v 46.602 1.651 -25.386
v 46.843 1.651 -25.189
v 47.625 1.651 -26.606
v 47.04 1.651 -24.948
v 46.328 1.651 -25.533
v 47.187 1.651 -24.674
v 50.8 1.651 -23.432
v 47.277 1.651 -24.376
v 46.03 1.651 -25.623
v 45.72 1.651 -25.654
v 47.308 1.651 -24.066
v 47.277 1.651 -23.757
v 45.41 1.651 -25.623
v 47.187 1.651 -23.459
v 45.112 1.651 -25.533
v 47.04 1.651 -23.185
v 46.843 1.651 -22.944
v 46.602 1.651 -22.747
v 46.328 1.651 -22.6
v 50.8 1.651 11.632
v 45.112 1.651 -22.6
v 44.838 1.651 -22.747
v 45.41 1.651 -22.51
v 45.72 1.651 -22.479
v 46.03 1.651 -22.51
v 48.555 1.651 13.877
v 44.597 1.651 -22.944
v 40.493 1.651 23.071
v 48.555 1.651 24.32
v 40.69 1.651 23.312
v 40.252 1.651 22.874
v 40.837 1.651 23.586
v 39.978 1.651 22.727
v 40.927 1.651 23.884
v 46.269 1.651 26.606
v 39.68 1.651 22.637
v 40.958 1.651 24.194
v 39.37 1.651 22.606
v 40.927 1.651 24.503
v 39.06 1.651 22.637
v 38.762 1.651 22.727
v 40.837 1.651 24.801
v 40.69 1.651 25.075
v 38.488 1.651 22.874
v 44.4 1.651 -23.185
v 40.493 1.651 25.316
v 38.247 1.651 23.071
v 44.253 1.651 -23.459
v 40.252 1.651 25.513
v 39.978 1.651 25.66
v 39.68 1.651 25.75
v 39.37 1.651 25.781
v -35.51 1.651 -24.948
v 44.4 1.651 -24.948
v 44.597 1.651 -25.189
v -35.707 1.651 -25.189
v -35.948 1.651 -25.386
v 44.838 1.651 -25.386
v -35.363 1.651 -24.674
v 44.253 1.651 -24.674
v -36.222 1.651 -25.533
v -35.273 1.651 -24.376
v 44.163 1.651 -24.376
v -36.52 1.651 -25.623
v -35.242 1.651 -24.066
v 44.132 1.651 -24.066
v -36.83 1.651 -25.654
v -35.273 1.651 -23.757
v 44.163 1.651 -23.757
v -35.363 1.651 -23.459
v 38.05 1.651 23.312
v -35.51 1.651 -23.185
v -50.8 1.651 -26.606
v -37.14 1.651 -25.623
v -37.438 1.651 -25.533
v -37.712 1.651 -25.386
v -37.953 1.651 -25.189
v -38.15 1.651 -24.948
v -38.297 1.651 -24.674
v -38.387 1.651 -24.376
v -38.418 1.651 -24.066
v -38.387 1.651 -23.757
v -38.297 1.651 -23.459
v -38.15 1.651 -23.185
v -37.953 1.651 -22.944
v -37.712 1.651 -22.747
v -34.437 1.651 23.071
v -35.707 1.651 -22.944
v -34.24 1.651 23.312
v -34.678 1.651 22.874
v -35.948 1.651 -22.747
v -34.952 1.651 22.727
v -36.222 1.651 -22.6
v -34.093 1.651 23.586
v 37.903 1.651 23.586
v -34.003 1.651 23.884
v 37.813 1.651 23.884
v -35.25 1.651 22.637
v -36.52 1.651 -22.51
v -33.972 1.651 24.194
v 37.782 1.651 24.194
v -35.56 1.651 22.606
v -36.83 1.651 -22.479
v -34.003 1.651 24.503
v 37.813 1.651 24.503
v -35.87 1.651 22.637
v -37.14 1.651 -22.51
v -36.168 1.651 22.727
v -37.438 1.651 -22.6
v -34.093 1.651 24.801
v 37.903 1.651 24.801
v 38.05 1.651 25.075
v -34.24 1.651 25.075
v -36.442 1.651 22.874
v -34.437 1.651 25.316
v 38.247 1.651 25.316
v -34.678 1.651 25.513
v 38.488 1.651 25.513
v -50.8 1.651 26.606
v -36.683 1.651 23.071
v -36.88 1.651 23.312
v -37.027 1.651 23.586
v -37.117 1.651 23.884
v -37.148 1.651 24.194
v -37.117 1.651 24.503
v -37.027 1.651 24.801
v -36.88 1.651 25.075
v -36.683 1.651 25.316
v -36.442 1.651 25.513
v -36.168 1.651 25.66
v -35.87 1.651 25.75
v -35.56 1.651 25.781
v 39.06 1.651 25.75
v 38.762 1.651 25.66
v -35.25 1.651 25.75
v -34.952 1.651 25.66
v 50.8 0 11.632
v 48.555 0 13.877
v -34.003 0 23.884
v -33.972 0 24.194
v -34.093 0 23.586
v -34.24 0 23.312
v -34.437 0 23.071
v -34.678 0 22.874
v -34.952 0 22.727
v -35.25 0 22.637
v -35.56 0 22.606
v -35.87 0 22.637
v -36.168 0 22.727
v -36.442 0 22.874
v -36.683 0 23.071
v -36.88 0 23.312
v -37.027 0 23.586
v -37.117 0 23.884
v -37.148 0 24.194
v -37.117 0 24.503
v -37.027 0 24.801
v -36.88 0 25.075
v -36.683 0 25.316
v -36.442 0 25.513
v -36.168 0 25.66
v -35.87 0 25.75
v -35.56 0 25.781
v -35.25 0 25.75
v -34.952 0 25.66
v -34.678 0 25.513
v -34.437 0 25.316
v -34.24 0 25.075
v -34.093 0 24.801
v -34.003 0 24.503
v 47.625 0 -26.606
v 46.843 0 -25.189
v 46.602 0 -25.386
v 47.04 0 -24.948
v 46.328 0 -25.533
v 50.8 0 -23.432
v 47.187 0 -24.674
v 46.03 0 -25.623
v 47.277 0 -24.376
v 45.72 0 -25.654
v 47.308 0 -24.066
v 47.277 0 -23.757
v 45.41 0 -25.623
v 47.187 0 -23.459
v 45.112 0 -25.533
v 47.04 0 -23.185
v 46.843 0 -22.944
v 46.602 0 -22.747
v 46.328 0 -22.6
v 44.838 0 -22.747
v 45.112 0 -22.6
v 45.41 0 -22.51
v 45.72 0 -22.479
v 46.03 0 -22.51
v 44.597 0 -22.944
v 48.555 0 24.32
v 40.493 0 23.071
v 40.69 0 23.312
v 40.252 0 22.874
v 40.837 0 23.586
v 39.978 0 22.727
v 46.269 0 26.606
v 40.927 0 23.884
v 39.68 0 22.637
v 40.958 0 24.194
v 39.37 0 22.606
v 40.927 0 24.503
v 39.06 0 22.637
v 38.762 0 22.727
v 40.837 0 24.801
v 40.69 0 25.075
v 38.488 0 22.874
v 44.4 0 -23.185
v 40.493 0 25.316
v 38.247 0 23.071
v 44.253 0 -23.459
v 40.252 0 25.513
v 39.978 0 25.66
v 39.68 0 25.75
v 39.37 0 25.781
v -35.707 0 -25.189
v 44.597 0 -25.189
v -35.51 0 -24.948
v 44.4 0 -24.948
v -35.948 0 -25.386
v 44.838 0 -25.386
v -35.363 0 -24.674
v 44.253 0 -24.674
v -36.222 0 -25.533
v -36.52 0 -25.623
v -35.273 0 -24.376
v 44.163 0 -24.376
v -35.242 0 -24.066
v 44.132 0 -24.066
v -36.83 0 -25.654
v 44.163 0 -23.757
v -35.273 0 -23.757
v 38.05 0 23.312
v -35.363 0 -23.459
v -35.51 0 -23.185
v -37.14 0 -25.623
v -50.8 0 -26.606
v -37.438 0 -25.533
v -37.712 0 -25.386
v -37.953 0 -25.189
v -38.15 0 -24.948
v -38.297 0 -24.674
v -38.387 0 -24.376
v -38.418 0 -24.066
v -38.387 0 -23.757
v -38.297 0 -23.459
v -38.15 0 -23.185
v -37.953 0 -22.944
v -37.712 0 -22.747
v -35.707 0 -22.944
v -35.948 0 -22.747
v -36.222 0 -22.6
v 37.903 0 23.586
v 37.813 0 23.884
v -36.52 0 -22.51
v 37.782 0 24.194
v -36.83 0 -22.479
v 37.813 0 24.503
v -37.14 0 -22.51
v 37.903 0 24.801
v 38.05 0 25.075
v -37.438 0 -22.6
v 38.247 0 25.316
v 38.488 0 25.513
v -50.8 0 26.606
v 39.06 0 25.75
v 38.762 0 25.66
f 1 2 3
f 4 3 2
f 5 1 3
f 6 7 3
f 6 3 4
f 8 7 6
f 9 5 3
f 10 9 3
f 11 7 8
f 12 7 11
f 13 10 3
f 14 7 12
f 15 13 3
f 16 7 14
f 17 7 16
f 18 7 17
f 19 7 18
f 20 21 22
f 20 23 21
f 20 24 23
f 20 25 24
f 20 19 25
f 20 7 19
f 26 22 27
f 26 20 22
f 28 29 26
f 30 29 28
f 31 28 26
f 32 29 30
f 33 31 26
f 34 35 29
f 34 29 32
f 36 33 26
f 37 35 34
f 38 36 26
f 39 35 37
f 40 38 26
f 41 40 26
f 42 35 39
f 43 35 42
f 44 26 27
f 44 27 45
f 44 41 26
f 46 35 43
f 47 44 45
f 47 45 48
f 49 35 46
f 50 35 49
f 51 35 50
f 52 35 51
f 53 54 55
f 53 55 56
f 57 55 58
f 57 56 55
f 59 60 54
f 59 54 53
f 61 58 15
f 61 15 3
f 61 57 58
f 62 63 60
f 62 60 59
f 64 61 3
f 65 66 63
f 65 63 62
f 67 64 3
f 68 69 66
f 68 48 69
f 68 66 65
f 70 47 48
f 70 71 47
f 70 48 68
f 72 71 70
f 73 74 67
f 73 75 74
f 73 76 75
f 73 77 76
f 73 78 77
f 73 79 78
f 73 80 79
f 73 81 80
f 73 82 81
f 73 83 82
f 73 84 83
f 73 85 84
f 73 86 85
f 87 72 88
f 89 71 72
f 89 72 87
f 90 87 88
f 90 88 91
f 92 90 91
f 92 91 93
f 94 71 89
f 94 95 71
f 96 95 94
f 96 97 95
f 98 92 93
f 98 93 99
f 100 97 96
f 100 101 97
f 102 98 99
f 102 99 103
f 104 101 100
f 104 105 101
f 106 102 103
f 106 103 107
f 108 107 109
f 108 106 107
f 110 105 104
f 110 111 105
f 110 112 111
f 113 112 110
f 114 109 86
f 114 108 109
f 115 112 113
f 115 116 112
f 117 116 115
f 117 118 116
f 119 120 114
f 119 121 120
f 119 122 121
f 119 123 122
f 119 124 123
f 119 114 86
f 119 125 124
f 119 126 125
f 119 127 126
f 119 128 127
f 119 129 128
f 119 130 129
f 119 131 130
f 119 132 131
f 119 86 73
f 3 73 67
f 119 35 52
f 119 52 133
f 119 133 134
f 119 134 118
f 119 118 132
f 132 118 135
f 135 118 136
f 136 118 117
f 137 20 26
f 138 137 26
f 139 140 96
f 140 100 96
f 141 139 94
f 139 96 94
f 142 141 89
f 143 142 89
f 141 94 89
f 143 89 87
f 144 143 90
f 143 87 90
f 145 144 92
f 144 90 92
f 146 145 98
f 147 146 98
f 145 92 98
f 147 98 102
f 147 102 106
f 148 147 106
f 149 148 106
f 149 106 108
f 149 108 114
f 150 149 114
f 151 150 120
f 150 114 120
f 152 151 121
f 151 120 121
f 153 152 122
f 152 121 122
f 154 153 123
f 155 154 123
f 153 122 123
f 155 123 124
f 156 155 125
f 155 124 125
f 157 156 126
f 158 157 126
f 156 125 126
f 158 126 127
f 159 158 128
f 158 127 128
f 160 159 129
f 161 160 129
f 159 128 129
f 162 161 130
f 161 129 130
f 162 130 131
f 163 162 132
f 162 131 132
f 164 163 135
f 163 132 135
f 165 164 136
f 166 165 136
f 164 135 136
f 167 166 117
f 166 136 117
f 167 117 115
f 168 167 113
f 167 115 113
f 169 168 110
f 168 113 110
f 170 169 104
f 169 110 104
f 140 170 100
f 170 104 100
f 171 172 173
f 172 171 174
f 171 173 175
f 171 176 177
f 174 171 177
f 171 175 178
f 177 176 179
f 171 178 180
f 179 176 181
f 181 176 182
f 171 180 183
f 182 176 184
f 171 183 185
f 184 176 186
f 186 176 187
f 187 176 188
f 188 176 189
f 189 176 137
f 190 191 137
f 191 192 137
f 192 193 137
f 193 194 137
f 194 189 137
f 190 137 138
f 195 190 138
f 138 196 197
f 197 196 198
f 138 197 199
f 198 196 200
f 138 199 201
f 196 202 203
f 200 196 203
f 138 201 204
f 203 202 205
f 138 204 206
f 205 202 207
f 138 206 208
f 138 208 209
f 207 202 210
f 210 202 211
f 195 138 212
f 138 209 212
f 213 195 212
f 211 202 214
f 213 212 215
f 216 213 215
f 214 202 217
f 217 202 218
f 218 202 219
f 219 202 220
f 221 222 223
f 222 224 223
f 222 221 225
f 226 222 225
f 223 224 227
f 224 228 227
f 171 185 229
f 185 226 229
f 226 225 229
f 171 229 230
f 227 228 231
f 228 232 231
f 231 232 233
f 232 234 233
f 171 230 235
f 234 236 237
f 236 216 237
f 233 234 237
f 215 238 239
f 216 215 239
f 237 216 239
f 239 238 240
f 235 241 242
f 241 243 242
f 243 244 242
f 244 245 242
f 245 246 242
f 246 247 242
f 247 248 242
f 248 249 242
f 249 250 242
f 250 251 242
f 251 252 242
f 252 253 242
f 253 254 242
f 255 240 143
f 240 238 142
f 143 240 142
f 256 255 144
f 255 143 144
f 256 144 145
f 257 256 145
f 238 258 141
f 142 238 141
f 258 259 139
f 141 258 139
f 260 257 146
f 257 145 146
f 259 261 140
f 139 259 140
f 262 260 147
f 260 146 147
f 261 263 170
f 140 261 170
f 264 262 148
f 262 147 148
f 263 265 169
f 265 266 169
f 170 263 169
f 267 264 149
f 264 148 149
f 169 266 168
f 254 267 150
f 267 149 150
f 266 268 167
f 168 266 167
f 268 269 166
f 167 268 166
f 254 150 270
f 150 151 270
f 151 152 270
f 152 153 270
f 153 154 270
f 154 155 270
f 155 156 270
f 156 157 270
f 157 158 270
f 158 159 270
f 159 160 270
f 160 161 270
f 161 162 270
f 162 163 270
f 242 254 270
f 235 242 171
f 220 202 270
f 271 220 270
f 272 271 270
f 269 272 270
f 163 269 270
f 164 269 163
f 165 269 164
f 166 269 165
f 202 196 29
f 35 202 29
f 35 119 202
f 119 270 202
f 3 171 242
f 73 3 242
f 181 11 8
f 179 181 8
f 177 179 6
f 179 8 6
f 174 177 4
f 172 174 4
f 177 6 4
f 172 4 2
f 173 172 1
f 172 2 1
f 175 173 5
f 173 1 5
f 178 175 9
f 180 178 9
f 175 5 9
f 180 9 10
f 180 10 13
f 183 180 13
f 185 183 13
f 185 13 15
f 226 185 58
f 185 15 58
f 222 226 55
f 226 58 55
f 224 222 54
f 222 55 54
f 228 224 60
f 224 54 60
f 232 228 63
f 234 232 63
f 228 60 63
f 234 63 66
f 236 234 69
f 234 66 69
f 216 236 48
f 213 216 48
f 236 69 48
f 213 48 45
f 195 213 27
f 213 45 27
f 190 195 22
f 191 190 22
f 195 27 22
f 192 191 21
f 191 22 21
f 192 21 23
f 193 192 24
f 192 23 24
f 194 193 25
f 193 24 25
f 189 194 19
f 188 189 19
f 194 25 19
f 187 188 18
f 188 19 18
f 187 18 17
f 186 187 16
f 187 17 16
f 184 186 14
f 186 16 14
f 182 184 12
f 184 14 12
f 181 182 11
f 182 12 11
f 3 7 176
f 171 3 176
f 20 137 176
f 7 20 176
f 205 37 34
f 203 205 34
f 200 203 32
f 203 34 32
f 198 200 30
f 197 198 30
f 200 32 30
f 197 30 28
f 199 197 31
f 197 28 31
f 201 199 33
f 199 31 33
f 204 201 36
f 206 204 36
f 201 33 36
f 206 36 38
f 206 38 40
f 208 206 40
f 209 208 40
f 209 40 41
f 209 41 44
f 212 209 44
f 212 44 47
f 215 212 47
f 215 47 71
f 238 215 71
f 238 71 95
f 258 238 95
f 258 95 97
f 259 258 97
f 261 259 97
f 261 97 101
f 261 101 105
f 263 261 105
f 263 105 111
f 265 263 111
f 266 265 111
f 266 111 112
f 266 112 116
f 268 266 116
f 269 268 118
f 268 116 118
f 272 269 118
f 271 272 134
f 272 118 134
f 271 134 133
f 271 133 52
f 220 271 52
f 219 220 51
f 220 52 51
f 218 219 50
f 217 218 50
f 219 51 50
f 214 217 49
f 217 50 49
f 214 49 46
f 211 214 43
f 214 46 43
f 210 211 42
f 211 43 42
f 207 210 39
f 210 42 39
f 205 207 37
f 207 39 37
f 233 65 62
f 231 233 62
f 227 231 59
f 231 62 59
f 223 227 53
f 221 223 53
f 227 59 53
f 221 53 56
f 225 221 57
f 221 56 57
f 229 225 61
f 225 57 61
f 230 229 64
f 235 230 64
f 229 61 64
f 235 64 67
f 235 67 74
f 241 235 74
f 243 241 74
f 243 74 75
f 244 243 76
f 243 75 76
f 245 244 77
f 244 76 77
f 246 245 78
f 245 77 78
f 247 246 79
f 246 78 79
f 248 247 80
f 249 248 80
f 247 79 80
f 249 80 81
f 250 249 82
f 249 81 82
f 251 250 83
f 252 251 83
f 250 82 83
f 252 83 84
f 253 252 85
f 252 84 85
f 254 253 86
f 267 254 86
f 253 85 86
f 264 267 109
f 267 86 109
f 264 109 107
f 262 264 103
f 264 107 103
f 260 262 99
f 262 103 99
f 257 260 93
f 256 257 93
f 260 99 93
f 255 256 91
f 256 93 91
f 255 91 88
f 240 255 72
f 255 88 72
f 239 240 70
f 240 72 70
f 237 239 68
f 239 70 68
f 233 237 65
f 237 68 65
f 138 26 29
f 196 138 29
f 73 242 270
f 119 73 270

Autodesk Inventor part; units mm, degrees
ref_plane "YZ Plane" through (0, 0, 0) normal (1, 0, 0) x (0, 1, 0)
ref_plane "XZ Plane" through (0, 0, 0) normal (0, 1, 0) x (-1, 0, 0)
ref_plane "XY Plane" through (0, 0, 0) normal (0, 0, 1) x (1, 0, 0)
sketch "Sketch1" plane through (0, 0, 0) normal (0, 1, 0) x (-1, 0, 0)
  line L0 (-50.8, -26.6065) -> (50.8, -26.6065)
  line L1 (50.8, -26.6065) -> (50.8, 26.6065)
  line L2 (50.8, 26.6065) -> (-50.8, 26.6065)
  line L3 (-50.8, 26.6065) -> (-50.8, -26.6065)
  line L4 (-50.8, -26.6065) -> (50.8, 26.6065) construction
  line L5 (50.8, -26.6065) -> (-50.8, 26.6065) construction
  point P0 (0, 0)
  dimension "d0" = 101.6
  dimension "d1" = 53.213
extrude "Extrusion1" add sketch "Sketch1" along normal blind 1.651
sketch "Sketch3" plane through (0, 1.651, 0) normal (0, 1, 0) x (1, 0, 0)
  line L0 (50.8, 26.6065) -> (-50.8, 26.6065) projected
  line L1 (-50.8, 26.6065) -> (-50.8, -26.6065) projected
  circle A0 centre (-36.83, 24.0665) radius 1.5875
  circle A1 centre (45.72, 24.0665) radius 1.5875
  circle A2 centre (-35.56, -24.1935) radius 1.5875
  circle A3 centre (39.37, -24.1935) radius 1.5875
  point P0 (0, 0)
  dimension "d4" = 3.175
  dimension "d5" = 2.54
  dimension "d6" = 13.97
  dimension "d7" = 3.175
  dimension "d10" = 3.175
  dimension "d12" = 3.175
  dimension "d35" = 50.8
  dimension "d36" = 15.24
  dimension "d37" = 2.54
  dimension "d38" = 96.52
  dimension "d39" = 50.8
  dimension "d40" = 90.17
extrude "Extrusion2" cut sketch "Sketch3" against normal blind 1.651
chamfer "Chamfer1" distance 3.175 angle 45 1 edges at (50.8, 0.8255, -26.6065) measured on face at (16.9333, 0.5503, -26.6065)
sketch "Sketch5" plane through (0, 1.651, 0) normal (0, 1, 0) x (1, 0, 0)
  line L0 (-50.8, 26.6065) -> (50.6857, 26.8236) construction
  line L1 (50.6857, 26.8236) -> (50.8, -26.6065) construction
  line L2 (50.8, -26.6065) -> (-50.6857, -26.8236) construction
  line L3 (-50.6857, -26.8236) -> (-50.8, 26.6065) construction
  point P0 (0, 0)
decal "Decal1"
sketch "Sketch6" plane through (0, 1.651, 0) normal (0, 1, 0) x (1, 0, 0)
  line L0 (47.625, 26.6065) -> (50.8, 23.4315) projected
  line L1 (-50.8, -26.6065) -> (50.8, -26.6065) projected
  line L2 (50.8, -26.6065) -> (50.8, 23.4315) projected
  line L3 (50.8, -11.6321) -> (48.5549, -13.8772)
  line L4 (48.5549, -13.8772) -> (48.5549, -26.6065)
  point P0 (0, 0)
extrude "Extrusion3" cut sketch "Sketch6" against normal blind 1.651
chamfer "Chamfer2" distance 2.286 angle 45 1 edges at (48.5549, 0.8255, 26.6065)
sketch "Sketch7" plane through (0, 0, 0) normal (0, -1, 0) x (1, 0, 0)
  line L0 (-50.8, 26.6065) -> (50.7588, 26.6844) construction
  line L1 (50.7588, 26.6844) -> (50.8, -27.0821) construction
  line L2 (50.8, -27.0821) -> (-50.7588, -27.1599) construction
  line L3 (-50.7588, -27.1599) -> (-50.8, 26.6065) construction
  point P0 (0, 0)
decal "Decal2"
properties part number "PCB-FIXED"
